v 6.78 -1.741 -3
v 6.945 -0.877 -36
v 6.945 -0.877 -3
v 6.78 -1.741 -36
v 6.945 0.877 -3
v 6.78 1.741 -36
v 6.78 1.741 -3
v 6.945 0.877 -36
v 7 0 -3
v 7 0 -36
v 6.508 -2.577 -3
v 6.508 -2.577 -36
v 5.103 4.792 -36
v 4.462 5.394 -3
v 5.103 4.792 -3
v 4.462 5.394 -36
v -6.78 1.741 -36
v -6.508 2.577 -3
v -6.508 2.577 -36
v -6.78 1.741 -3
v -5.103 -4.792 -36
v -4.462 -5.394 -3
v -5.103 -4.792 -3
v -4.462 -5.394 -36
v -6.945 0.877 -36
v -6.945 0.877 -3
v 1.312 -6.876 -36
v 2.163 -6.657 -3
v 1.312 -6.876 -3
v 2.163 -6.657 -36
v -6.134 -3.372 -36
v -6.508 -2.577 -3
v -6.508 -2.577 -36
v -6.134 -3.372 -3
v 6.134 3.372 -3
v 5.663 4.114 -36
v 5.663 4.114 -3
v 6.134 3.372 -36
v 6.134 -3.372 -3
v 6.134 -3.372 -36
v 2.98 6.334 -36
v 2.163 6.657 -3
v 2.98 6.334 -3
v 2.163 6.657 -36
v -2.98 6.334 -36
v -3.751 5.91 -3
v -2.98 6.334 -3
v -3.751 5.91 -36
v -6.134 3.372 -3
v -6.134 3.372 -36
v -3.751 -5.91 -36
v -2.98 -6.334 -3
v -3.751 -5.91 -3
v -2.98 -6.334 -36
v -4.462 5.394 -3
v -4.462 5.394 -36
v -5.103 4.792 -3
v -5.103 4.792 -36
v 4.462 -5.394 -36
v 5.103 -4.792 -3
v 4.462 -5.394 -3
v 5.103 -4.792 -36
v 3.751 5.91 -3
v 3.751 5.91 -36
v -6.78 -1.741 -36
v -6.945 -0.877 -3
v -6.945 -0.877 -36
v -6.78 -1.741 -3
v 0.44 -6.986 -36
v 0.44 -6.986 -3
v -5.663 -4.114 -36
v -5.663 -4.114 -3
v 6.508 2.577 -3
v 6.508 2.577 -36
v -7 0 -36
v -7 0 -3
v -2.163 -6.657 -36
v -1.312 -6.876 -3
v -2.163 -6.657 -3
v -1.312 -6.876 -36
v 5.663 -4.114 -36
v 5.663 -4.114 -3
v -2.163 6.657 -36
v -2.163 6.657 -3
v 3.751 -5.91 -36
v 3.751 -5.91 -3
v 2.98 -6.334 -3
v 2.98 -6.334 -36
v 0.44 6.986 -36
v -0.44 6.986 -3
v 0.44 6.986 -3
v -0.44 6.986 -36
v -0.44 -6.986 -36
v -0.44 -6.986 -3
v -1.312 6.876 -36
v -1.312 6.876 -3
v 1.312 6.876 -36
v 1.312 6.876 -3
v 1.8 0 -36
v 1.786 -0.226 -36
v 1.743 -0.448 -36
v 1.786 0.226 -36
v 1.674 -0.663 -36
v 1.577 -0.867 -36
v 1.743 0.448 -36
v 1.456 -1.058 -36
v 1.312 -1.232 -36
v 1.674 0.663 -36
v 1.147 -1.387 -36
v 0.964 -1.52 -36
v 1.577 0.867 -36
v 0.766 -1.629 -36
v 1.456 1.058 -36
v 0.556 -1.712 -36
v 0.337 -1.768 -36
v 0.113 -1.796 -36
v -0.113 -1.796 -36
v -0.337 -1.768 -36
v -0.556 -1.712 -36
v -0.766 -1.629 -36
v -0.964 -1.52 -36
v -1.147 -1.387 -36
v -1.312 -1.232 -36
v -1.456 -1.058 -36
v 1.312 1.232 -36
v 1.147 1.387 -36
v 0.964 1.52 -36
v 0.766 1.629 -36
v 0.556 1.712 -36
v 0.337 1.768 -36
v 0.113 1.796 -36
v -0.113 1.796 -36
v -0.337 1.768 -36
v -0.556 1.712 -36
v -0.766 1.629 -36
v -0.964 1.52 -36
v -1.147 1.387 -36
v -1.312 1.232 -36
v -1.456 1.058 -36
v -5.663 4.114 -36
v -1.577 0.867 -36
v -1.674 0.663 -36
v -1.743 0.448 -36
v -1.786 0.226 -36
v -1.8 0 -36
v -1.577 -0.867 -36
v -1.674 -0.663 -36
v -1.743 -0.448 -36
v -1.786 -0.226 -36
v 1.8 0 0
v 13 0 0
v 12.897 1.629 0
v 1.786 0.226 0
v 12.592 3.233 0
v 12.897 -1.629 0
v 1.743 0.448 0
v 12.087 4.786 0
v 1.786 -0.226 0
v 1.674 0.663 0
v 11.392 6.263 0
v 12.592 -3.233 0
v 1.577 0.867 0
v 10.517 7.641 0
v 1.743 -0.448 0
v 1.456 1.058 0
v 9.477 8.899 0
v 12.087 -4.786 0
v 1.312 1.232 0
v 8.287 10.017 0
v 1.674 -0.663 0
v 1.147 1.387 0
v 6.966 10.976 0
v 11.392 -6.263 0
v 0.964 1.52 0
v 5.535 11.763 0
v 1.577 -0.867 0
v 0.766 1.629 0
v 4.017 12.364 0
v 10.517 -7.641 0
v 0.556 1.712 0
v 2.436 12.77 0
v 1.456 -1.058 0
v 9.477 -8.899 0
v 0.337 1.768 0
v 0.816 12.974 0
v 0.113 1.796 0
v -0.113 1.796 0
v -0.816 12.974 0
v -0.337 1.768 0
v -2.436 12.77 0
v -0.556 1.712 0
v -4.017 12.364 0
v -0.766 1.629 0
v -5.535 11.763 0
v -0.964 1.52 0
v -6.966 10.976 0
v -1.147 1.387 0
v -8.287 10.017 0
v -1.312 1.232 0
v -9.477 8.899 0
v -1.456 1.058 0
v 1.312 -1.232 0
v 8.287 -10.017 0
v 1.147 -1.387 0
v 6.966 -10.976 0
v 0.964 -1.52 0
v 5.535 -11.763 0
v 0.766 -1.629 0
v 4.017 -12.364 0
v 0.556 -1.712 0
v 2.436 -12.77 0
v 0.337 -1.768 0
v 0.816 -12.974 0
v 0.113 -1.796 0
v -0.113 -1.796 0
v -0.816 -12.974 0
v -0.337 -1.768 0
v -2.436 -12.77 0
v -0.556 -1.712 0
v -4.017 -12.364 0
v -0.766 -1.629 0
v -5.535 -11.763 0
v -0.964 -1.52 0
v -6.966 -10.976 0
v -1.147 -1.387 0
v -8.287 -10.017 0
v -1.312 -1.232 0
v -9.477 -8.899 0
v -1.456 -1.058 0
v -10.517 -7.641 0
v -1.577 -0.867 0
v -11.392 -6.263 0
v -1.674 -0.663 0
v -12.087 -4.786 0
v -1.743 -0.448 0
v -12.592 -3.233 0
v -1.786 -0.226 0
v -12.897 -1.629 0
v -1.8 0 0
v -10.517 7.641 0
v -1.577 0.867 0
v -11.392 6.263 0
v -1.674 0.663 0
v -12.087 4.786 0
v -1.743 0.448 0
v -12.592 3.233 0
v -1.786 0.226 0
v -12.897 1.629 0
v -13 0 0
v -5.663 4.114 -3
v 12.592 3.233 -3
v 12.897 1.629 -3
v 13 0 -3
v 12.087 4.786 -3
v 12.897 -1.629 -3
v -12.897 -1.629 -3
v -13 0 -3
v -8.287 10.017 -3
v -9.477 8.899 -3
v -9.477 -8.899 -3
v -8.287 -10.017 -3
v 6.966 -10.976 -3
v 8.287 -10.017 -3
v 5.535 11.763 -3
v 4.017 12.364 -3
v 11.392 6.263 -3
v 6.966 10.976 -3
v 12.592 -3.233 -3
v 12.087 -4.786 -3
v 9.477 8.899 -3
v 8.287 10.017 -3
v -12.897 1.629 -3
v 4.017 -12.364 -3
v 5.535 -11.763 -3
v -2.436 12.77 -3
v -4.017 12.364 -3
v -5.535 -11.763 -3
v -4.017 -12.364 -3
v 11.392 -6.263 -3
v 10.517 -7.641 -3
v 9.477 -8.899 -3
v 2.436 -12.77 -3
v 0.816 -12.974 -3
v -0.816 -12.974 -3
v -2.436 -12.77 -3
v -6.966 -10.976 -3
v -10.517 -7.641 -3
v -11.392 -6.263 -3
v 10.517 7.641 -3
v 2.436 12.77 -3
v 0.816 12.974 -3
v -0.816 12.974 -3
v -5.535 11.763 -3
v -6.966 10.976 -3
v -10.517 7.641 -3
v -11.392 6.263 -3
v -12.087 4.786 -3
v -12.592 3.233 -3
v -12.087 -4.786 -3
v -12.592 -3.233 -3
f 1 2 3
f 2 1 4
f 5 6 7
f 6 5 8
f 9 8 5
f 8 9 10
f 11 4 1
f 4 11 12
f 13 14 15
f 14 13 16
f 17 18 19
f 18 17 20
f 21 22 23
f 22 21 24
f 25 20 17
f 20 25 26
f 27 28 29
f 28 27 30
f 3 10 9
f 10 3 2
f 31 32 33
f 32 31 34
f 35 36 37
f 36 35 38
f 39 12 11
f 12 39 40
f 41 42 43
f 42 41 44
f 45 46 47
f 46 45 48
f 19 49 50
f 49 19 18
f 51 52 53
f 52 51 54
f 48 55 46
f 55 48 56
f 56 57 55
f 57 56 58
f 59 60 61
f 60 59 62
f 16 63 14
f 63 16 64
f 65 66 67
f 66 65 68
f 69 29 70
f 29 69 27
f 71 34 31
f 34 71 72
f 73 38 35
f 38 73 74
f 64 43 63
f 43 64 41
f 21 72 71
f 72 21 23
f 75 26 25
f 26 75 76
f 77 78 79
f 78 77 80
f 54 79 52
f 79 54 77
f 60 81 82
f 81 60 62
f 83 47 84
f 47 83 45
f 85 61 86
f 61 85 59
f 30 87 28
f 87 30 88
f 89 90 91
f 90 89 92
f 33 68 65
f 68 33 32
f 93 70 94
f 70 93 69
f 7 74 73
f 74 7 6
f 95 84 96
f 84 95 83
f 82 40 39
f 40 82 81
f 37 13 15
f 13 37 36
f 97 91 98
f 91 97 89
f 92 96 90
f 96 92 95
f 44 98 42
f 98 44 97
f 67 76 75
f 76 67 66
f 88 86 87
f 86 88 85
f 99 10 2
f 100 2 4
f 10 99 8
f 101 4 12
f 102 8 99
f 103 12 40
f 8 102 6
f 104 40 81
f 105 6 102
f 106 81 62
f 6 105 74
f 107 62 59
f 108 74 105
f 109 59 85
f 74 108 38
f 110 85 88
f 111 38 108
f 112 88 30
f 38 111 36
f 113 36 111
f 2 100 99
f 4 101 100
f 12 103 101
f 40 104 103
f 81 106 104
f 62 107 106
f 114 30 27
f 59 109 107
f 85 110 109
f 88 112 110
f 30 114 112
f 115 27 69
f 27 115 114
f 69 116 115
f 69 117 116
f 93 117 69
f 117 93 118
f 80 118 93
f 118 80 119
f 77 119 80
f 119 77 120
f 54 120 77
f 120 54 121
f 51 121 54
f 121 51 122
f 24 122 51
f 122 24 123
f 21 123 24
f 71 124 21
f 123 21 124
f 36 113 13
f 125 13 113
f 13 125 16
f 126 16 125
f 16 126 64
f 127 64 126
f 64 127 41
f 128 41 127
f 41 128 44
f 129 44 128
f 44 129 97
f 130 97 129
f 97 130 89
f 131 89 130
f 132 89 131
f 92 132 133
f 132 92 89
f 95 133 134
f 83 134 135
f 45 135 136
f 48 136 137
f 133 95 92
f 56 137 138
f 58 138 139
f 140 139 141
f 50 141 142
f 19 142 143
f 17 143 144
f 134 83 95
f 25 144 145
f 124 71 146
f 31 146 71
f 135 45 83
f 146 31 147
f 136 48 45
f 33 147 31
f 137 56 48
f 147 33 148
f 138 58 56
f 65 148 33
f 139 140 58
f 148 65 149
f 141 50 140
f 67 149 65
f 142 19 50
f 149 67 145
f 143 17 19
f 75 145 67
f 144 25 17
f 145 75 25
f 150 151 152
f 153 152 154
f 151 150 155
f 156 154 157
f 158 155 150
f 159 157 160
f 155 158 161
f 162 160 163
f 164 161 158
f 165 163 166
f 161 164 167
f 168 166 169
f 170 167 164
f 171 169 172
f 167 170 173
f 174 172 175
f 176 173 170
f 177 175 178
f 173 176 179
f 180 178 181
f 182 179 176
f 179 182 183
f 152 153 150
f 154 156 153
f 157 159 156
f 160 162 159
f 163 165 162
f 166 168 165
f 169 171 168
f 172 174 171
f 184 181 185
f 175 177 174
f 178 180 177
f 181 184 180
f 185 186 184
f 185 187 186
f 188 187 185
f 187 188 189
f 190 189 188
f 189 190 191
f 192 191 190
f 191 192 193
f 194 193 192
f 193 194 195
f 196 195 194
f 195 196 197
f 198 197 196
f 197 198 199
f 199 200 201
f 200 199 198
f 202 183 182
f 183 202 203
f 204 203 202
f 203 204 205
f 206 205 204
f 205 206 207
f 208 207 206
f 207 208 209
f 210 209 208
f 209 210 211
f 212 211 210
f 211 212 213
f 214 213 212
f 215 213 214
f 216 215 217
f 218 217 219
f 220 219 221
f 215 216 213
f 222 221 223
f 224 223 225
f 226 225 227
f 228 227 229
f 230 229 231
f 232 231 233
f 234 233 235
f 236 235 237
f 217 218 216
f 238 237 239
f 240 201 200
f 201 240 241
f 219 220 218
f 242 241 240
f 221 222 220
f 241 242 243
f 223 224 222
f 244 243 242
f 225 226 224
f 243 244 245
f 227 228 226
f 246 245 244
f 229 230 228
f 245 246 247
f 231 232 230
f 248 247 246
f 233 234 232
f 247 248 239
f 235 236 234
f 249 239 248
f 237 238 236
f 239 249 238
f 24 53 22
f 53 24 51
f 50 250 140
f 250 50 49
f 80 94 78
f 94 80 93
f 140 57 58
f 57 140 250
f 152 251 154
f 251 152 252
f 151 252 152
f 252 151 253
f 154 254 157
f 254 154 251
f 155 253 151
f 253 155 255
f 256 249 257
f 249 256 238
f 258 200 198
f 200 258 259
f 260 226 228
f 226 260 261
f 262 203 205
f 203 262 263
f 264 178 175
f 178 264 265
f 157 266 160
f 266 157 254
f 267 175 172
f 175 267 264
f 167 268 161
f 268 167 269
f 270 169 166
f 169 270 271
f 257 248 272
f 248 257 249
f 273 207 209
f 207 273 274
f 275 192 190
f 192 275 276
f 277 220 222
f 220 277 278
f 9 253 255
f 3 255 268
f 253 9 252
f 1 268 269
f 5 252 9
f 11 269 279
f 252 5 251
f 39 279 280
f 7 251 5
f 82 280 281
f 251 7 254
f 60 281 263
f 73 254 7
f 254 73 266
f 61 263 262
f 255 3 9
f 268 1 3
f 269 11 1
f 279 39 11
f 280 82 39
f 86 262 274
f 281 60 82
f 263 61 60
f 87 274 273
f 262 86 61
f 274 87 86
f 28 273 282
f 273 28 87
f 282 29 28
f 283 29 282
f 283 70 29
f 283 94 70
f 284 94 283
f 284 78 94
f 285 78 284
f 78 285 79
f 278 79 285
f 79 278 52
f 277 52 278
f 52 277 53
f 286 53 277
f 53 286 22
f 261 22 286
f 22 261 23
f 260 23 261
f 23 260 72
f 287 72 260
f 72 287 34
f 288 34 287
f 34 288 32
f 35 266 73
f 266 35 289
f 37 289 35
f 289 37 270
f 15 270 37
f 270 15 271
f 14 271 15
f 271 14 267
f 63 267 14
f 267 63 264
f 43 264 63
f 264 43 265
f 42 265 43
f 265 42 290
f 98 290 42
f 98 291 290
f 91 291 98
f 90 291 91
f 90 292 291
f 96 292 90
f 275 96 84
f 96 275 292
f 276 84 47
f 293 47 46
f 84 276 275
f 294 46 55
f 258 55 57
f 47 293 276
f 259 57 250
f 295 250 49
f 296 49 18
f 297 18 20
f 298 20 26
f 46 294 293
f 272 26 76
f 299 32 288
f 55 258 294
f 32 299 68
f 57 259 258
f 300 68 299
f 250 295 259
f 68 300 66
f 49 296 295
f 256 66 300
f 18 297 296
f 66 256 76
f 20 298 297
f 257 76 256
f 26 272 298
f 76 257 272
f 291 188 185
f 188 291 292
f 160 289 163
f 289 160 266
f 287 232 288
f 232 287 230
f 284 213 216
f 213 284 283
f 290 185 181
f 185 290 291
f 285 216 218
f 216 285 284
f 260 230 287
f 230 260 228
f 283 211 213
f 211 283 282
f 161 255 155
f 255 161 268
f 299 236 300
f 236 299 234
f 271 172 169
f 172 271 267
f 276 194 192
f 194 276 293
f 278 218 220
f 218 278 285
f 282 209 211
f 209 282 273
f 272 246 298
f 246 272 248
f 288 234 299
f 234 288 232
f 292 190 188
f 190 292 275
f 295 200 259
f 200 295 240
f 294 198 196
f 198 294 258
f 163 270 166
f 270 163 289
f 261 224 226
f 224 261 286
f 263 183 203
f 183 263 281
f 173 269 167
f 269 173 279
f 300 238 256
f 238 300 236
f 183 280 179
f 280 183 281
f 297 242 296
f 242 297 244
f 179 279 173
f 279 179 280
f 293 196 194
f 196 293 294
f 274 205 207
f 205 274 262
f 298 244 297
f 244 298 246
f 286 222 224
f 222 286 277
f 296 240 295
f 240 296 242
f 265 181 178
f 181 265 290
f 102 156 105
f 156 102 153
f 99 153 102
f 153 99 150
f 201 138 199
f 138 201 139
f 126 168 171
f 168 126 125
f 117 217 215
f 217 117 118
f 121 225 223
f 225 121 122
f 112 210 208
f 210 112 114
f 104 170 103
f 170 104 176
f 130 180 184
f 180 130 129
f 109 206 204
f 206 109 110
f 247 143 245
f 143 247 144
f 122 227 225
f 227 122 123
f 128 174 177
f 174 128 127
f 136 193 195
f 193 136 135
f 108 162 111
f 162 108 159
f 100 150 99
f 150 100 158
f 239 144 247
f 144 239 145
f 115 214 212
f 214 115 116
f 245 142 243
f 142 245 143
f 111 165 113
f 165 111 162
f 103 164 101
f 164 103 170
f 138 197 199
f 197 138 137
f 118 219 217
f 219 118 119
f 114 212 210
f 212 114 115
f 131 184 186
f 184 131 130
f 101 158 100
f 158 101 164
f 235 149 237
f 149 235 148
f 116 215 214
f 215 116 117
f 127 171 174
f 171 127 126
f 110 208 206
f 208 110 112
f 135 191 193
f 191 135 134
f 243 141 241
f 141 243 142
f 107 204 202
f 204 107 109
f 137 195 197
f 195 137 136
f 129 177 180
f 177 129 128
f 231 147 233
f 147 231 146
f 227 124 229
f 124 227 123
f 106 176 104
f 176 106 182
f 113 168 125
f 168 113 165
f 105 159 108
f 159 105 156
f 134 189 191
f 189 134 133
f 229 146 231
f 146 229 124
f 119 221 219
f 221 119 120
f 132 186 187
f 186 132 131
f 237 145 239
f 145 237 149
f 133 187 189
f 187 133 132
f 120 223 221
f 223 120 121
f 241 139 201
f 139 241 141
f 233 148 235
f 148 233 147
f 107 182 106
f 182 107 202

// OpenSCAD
$fn = 50;


difference() {
	union() {
		translate(v = [0, 0, -36.0000000000]) {
			cylinder(h = 36, r = 7.0000000000);
		}
		translate(v = [0, 0, -3.0000000000]) {
			cylinder(h = 3, r = 13.0000000000);
		}
	}
	union() {
		#translate(v = [0, 0, -36]) {
			cylinder(h = 36, r = 1.8000000000);
		}
	}
}
